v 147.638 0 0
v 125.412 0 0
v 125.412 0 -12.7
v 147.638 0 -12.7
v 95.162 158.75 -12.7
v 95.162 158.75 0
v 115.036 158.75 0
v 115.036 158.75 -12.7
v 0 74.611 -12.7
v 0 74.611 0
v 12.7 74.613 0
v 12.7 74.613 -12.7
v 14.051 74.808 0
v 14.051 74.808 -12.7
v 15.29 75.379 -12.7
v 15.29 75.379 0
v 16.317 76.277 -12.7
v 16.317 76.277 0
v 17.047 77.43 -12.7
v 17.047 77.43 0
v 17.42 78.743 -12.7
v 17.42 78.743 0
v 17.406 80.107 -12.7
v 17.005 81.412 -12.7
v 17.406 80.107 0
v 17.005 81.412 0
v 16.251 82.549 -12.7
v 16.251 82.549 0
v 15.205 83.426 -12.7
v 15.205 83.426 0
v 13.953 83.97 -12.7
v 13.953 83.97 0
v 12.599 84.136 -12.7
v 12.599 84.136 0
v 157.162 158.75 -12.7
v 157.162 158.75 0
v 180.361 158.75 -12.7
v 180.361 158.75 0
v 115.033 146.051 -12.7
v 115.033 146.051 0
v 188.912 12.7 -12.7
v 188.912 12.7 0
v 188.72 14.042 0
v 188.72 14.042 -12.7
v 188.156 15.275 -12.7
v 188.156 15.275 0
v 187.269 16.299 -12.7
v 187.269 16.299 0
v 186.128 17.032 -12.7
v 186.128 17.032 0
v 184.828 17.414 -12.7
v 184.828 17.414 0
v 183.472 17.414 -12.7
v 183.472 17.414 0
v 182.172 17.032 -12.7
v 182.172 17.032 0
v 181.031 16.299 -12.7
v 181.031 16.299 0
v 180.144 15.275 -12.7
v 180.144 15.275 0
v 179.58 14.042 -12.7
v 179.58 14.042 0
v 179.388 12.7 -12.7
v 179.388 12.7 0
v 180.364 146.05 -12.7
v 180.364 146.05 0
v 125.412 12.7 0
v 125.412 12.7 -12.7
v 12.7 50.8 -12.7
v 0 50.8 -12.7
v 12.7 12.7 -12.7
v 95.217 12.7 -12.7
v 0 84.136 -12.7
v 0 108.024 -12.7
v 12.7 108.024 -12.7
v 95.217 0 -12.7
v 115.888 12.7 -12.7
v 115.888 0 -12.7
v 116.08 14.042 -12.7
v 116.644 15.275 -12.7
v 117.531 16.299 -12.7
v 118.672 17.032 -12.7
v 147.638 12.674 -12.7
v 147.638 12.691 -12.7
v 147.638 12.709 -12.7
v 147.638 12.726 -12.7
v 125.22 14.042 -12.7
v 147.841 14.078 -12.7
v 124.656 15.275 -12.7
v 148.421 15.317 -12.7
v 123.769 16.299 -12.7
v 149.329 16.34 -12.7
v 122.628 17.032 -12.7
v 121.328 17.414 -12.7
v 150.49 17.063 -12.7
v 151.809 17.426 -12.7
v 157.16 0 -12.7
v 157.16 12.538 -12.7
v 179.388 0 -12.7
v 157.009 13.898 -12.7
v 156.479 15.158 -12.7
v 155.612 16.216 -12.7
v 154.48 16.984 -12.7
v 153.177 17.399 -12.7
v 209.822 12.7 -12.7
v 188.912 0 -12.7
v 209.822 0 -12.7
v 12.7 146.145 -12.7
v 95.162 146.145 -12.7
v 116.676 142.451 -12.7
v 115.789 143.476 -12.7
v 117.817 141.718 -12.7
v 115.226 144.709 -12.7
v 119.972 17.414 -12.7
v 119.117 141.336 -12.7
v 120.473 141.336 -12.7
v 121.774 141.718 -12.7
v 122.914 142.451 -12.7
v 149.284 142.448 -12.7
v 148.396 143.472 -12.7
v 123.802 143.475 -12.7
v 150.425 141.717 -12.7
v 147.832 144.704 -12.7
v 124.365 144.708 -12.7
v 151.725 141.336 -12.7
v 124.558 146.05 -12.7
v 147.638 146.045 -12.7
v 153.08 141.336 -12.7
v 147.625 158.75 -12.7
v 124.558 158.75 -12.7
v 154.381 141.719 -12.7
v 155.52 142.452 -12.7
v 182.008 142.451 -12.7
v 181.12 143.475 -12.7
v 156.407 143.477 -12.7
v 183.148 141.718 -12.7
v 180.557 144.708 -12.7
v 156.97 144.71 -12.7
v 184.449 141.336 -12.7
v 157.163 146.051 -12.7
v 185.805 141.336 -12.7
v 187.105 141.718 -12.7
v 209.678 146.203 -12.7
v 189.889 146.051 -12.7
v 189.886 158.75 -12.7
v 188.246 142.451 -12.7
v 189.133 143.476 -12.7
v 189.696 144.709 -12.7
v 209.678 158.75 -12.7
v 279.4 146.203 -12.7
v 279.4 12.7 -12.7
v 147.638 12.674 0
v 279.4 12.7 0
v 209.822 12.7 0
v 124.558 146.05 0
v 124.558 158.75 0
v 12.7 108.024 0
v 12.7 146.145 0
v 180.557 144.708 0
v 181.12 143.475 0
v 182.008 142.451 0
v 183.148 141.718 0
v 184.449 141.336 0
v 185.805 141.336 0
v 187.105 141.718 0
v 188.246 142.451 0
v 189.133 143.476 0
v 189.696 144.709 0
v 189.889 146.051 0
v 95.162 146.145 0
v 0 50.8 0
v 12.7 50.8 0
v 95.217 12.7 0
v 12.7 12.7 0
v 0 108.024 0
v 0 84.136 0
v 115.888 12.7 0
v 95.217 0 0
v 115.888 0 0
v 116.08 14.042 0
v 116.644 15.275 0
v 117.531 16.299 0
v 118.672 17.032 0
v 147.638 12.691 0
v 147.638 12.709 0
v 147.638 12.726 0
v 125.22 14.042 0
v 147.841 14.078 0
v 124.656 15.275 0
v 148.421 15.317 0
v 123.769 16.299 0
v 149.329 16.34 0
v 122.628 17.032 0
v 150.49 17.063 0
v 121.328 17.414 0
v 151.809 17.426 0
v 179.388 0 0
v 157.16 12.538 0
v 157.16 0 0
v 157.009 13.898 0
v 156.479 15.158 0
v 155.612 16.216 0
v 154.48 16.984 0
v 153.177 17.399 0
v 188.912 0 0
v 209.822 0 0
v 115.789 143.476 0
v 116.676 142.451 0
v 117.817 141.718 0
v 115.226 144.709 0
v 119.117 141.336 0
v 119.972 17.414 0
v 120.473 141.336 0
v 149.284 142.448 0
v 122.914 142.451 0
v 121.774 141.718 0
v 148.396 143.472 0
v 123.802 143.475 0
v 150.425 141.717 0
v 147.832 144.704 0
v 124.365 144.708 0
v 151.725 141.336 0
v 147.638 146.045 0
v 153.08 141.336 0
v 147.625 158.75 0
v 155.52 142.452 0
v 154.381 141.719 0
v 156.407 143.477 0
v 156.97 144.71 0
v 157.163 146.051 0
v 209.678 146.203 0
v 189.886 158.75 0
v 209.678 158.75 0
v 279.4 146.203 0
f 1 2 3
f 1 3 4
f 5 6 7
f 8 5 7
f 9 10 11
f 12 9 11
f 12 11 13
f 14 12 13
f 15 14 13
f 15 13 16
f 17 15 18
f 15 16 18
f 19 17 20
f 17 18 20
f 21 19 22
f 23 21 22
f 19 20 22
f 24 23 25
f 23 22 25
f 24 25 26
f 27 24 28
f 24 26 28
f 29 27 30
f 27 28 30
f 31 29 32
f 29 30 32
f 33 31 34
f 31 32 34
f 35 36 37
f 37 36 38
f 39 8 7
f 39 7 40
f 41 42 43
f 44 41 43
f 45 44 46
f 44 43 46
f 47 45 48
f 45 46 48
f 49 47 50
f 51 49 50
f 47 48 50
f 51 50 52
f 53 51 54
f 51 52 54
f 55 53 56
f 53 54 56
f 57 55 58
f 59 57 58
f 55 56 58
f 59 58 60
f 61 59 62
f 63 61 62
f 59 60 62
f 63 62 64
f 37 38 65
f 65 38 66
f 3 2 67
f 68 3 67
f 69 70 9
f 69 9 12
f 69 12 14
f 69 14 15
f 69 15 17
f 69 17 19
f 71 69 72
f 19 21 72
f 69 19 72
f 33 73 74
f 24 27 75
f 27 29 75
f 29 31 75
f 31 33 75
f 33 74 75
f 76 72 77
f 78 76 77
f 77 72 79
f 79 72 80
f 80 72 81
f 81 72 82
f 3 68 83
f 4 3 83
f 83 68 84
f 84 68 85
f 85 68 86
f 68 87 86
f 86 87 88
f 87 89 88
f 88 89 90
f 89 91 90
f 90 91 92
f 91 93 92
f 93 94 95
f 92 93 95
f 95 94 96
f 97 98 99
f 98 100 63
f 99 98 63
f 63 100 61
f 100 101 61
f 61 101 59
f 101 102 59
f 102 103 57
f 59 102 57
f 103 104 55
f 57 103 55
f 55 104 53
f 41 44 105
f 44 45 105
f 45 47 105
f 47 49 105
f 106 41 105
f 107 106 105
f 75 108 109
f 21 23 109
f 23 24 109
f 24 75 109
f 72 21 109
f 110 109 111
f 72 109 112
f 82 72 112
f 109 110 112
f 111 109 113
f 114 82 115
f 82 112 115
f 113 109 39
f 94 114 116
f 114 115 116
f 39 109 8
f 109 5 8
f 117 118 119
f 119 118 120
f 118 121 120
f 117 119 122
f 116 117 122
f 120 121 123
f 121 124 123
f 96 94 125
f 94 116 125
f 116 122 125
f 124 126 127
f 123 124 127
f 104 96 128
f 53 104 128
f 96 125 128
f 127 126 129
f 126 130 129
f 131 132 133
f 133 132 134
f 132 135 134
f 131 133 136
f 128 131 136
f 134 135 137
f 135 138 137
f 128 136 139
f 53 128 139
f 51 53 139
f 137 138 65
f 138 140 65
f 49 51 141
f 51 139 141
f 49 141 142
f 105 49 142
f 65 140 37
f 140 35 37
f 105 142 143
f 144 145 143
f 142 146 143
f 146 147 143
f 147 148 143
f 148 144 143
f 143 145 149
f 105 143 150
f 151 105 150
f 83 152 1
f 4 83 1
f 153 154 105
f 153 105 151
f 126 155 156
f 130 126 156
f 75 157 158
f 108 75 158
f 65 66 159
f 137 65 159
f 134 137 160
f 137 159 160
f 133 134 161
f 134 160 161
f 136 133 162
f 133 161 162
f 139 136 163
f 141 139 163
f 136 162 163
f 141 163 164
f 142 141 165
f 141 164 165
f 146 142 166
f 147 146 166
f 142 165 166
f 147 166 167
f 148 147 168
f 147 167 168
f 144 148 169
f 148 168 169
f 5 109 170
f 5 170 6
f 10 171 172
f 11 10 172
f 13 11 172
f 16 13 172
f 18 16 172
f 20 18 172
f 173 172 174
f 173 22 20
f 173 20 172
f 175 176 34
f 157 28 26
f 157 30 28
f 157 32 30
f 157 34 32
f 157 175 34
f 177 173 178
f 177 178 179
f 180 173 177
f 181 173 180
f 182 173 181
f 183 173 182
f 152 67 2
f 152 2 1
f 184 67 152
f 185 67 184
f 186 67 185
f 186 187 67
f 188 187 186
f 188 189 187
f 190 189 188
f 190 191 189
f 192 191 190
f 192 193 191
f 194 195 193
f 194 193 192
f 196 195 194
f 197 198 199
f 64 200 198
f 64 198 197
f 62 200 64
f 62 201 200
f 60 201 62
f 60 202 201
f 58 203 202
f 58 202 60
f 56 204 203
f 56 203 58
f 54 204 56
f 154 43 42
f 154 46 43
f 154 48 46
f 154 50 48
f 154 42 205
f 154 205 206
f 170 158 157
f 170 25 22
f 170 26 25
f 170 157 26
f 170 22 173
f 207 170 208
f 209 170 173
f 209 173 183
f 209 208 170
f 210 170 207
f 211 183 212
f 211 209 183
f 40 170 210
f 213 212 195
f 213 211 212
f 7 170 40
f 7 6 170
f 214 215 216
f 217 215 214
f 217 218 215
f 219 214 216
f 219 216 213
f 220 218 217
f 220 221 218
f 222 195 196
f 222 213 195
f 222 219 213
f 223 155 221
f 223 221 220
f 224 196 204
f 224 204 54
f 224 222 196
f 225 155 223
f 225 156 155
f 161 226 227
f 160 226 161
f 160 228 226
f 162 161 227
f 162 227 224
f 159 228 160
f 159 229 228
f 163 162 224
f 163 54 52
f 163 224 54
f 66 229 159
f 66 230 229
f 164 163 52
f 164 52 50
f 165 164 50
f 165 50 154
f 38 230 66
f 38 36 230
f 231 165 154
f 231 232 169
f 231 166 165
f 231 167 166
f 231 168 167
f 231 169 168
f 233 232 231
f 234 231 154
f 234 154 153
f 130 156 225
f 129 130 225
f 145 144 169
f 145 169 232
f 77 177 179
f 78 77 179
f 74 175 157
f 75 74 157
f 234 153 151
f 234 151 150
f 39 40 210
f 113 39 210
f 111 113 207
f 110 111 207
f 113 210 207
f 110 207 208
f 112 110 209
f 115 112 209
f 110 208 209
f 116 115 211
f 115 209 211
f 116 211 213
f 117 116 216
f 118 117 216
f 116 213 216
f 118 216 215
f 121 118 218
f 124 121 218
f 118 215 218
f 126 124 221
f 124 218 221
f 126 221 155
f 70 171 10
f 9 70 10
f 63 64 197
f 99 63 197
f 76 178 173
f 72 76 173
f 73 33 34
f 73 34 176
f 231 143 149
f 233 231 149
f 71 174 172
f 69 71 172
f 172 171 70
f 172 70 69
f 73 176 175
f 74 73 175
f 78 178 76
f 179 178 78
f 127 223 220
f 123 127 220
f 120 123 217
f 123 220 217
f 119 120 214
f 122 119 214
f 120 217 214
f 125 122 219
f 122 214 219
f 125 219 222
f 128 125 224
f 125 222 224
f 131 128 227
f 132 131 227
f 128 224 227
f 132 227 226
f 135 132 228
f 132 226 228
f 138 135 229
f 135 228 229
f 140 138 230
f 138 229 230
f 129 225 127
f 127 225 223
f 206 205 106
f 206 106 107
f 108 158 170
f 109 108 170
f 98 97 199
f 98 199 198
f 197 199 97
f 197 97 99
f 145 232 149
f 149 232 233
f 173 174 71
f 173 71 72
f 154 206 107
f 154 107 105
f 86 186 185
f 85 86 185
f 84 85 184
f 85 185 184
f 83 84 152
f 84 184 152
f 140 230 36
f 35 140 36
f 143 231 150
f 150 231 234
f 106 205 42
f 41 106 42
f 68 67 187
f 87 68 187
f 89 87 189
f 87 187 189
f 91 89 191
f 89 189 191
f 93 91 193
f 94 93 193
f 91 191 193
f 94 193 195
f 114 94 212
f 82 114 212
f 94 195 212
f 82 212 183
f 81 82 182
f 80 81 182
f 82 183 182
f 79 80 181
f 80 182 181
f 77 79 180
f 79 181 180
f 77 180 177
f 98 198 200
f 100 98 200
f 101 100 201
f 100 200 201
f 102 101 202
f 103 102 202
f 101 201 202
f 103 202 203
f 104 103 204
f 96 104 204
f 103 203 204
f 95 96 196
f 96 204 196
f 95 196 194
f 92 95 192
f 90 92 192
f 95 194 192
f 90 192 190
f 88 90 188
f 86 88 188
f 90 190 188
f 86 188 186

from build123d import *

# Parameters (mm, degrees)
F0_W      = 279.4
F0_H      = 158.75
F1_DEPTH  = 12.7
F2_W      = 12.7
F2_H      = 50.8
F3_DEPTH  = 12.701
F5_DEPTH  = 12.701
F6_W      = 69.85
F6_H      = 12.7
F6_W_2    = 82.55
F7_DEPTH  = 12.701
F9_DEPTH  = 12.701
F10_DEPTH = 12.701


with BuildPart() as f1:
    # F0 (on Top) → F1 (new body)
    with BuildSketch(Plane.XY):
        with Locations((139.7, 79.375)):
            Rectangle(F0_W, F0_H)
    extrude(amount=-F1_DEPTH)

    # F2 (on Top) → F3 (cut, through all)
    with BuildSketch(Plane.XY):
        with Locations((6.35, 133.423964)):
            Rectangle(F2_W, F2_H)
        with Locations((6.35, 25.4)):
            Rectangle(F2_W, F2_H)
    extrude(amount=-F3_DEPTH, mode=Mode.SUBTRACT)

    # F4 (on Top) → F5 (cut, through all)
    with BuildSketch(Plane.XY):
        with BuildLine():
            Line((0, 74.611429), (12.700348, 74.6125))
            ThreePointArc((12.700348, 74.6125), (17.462176, 79.425701), (12.598951, 84.136429))
            Line((12.598951, 84.136429), (0, 84.136429))
            Line((0, 84.136429), (0, 74.611429))
        make_face()
    extrude(amount=-F5_DEPTH, mode=Mode.SUBTRACT)

    # F6 (on Top) → F7 (cut, through all)
    with BuildSketch(Plane.XY):
        with Locations((244.747044, 6.35)):
            Rectangle(F6_W, F6_H)
        with Locations((53.942362, 6.35)):
            Rectangle(F6_W_2, F6_H)
        with Locations((53.887489, 152.495061)):
            Rectangle(F6_W_2, F6_H)
        with Locations((244.602786, 152.552579)):
            Rectangle(F6_W, F6_H)
    extrude(amount=-F7_DEPTH, mode=Mode.SUBTRACT)

    # F8 (on Top) → F9 (cut, through all)
    with BuildSketch(Plane.XY):
        with BuildLine():
            Line((147.625268, 158.788487), (147.637502, 146.045427))
            ThreePointArc((147.637502, 146.045427), (152.40284, 141.287501), (157.1625, 146.051108))
            Line((157.1625, 146.051108), (157.1625, 158.788487))
            Line((157.1625, 158.788487), (147.625268, 158.788487))
        make_face()
        with BuildLine():
            Line((157.159752, 0), (157.159752, 12.538237))
            ThreePointArc((157.159752, 12.538237), (152.493737, 17.461577), (147.637569, 12.725692))
            ThreePointArc((147.637569, 12.725692), (147.6375, 12.7), (147.637569, 12.674308))
            Line((147.637569, 12.674308), (147.637569, 0))
            Line((147.637569, 0), (157.159752, 0))
        make_face()
    extrude(amount=-F9_DEPTH, mode=Mode.SUBTRACT)

    # F8 (on Top) → F10 (cut, through all)
    with BuildSketch(Plane.XY):
        with BuildLine():
            Line((157.159752, 0), (157.159752, 12.538237))
            ThreePointArc((157.159752, 12.538237), (152.493737, 17.461577), (147.637569, 12.725692))
            ThreePointArc((147.637569, 12.725692), (147.6375, 12.7), (147.637569, 12.674308))
            Line((147.637569, 12.674308), (147.637569, 0))
            Line((147.637569, 0), (157.159752, 0))
        make_face()
        with BuildLine():
            Line((188.9125, 0), (188.9125, 12.7))
            ThreePointArc((188.9125, 12.7), (184.15, 17.4625), (179.3875, 12.7))
            Line((179.3875, 12.7), (179.3875, 0))
            Line((179.3875, 0), (188.9125, 0))
        make_face()
        with BuildLine():
            Line((125.4125, 0), (125.4125, 12.7))
            ThreePointArc((125.4125, 12.7), (120.65, 17.4625), (115.8875, 12.7))
            Line((115.8875, 12.7), (115.8875, 0))
            Line((115.8875, 0), (125.4125, 0))
        make_face()
        with BuildLine():
            Line((115.036184, 158.751108), (115.03323, 146.051108))
            ThreePointArc((115.03323, 146.051108), (119.795176, 141.2875), (124.55823, 146.05))
            Line((124.55823, 146.05), (124.55823, 158.751108))
            Line((124.55823, 158.751108), (115.036184, 158.751108))
        make_face()
        with BuildLine():
            Line((147.625268, 158.788487), (147.637502, 146.045427))
            ThreePointArc((147.637502, 146.045427), (152.40284, 141.287501), (157.1625, 146.051108))
            Line((157.1625, 146.051108), (157.1625, 158.788487))
            Line((157.1625, 158.788487), (147.625268, 158.788487))
        make_face()
        with BuildLine():
            Line((180.360956, 158.751108), (180.363911, 146.05))
            ThreePointArc((180.363911, 146.05), (185.126964, 141.2875), (189.88891, 146.051108))
            Line((189.88891, 146.051108), (189.885956, 158.751108))
            Line((189.885956, 158.751108), (180.360956, 158.751108))
        make_face()
    extrude(amount=-F10_DEPTH, mode=Mode.SUBTRACT)


solid = f1.part
